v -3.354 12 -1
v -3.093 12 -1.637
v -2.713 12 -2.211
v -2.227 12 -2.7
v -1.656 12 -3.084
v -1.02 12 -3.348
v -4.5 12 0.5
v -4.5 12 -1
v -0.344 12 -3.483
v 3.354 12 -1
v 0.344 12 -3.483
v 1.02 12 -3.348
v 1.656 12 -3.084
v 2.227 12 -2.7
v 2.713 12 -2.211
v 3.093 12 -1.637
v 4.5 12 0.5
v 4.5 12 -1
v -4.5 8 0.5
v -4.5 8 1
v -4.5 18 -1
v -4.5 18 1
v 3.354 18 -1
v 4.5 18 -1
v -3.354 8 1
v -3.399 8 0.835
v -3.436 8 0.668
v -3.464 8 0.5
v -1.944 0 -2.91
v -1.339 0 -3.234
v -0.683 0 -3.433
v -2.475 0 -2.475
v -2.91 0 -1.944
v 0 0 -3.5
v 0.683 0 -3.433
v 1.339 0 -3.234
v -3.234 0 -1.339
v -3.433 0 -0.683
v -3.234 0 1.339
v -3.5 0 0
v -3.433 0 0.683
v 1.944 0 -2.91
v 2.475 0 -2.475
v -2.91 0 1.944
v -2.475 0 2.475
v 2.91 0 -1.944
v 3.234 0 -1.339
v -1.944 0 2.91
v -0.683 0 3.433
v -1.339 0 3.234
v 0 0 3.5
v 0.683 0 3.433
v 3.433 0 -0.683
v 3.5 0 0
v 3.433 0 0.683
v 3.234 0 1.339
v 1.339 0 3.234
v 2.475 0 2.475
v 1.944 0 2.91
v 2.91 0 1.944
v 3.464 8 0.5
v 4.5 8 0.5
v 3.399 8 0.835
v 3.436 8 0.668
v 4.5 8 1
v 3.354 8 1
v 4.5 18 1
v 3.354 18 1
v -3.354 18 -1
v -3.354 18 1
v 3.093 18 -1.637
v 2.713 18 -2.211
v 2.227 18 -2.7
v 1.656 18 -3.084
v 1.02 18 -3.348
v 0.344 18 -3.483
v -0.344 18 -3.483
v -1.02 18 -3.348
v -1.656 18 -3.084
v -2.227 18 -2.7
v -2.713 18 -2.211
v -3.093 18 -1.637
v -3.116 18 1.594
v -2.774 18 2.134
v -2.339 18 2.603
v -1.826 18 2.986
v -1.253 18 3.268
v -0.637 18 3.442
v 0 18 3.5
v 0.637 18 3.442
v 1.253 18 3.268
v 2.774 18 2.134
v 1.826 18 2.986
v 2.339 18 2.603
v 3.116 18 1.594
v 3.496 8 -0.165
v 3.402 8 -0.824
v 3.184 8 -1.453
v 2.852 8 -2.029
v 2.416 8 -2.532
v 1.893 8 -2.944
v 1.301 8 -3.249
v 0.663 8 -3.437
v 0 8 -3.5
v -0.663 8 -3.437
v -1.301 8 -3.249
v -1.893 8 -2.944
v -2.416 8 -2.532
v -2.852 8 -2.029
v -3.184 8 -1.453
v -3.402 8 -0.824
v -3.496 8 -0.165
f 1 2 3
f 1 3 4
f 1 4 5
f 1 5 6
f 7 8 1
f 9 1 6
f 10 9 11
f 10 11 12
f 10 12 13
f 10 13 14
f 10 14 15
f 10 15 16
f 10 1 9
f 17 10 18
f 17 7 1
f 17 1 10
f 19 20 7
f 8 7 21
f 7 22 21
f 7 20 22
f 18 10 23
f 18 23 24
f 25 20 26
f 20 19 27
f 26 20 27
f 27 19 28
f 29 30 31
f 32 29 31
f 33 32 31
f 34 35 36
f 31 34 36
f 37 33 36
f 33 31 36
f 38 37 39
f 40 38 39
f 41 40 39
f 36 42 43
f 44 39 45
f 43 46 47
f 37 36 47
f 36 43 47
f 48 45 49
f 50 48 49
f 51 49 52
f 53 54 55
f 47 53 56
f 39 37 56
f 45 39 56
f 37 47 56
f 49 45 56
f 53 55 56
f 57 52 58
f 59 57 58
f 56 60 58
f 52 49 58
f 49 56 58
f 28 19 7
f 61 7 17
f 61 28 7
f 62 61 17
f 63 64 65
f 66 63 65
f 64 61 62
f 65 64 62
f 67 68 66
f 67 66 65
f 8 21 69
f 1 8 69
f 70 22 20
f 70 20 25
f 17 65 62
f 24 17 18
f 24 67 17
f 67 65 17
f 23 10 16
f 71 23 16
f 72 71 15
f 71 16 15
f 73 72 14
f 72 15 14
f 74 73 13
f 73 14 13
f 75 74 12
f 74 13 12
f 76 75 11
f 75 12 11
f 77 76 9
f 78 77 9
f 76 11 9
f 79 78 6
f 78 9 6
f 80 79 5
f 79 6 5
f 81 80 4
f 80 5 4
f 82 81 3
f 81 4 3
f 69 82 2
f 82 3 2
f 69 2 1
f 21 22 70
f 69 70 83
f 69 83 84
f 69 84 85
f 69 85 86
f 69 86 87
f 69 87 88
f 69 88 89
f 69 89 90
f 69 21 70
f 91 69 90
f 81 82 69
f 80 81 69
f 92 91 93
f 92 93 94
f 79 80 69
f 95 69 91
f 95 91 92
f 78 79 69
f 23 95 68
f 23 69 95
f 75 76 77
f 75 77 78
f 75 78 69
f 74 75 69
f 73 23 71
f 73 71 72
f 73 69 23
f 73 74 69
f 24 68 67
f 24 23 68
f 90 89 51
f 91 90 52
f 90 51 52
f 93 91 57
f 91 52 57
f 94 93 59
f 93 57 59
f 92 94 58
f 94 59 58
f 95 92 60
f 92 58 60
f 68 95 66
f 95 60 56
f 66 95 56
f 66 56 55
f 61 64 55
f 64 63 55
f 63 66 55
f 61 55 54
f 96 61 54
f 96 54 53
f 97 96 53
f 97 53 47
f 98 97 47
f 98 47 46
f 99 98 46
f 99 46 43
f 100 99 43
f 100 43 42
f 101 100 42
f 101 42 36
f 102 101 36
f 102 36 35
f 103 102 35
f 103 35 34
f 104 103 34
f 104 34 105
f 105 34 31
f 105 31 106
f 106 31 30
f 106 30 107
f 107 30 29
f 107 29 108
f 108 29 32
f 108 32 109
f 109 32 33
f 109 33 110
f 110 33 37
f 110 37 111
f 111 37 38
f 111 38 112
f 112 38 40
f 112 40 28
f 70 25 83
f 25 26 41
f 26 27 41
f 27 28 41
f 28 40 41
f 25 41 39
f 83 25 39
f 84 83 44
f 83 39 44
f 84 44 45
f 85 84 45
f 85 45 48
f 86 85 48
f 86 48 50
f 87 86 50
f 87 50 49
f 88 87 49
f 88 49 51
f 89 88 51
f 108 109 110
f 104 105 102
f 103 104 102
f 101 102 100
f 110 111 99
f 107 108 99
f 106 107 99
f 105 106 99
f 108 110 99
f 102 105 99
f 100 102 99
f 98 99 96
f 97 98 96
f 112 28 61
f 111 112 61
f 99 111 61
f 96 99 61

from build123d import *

# Parameters (mm, degrees)
SKETCH1_R           = 3.5
BOSS_EXTRUDE1_DEPTH = 18
SKETCH2_W           = 9
SKETCH2_H           = 2
BOSS_EXTRUDE3_DEPTH = 10
CUT_EXTRUDE3_START  = -8
SKETCH3_W           = 10
SKETCH3_H           = 4
CUT_EXTRUDE3_DEPTH  = 4


with BuildPart() as part:
    # Sketch1 → Boss-Extrude1 (new body)
    with BuildSketch(Plane(origin=(0, 0, 0), x_dir=(1, 0, 0), z_dir=(0, 1, 0))):
        with Locations(Location((0, 0, 0), (0, 0, 270))):
            Circle(SKETCH1_R)
    extrude(amount=BOSS_EXTRUDE1_DEPTH)

    # Sketch2 → Boss-Extrude3 (add)
    with BuildSketch(Plane(origin=(0, 18, 0), x_dir=(1, 0, 0), z_dir=(0, 1, 0))):
        Rectangle(SKETCH2_W, SKETCH2_H)
    extrude(amount=-BOSS_EXTRUDE3_DEPTH)

    # Sketch3 → Cut-Extrude3 (cut)
    with BuildSketch(Plane.XZ.offset(CUT_EXTRUDE3_START)):
        with Locations((0, -1.5)):
            Rectangle(SKETCH3_W, SKETCH3_H)
    extrude(amount=-CUT_EXTRUDE3_DEPTH, mode=Mode.SUBTRACT)


solid = part.part
